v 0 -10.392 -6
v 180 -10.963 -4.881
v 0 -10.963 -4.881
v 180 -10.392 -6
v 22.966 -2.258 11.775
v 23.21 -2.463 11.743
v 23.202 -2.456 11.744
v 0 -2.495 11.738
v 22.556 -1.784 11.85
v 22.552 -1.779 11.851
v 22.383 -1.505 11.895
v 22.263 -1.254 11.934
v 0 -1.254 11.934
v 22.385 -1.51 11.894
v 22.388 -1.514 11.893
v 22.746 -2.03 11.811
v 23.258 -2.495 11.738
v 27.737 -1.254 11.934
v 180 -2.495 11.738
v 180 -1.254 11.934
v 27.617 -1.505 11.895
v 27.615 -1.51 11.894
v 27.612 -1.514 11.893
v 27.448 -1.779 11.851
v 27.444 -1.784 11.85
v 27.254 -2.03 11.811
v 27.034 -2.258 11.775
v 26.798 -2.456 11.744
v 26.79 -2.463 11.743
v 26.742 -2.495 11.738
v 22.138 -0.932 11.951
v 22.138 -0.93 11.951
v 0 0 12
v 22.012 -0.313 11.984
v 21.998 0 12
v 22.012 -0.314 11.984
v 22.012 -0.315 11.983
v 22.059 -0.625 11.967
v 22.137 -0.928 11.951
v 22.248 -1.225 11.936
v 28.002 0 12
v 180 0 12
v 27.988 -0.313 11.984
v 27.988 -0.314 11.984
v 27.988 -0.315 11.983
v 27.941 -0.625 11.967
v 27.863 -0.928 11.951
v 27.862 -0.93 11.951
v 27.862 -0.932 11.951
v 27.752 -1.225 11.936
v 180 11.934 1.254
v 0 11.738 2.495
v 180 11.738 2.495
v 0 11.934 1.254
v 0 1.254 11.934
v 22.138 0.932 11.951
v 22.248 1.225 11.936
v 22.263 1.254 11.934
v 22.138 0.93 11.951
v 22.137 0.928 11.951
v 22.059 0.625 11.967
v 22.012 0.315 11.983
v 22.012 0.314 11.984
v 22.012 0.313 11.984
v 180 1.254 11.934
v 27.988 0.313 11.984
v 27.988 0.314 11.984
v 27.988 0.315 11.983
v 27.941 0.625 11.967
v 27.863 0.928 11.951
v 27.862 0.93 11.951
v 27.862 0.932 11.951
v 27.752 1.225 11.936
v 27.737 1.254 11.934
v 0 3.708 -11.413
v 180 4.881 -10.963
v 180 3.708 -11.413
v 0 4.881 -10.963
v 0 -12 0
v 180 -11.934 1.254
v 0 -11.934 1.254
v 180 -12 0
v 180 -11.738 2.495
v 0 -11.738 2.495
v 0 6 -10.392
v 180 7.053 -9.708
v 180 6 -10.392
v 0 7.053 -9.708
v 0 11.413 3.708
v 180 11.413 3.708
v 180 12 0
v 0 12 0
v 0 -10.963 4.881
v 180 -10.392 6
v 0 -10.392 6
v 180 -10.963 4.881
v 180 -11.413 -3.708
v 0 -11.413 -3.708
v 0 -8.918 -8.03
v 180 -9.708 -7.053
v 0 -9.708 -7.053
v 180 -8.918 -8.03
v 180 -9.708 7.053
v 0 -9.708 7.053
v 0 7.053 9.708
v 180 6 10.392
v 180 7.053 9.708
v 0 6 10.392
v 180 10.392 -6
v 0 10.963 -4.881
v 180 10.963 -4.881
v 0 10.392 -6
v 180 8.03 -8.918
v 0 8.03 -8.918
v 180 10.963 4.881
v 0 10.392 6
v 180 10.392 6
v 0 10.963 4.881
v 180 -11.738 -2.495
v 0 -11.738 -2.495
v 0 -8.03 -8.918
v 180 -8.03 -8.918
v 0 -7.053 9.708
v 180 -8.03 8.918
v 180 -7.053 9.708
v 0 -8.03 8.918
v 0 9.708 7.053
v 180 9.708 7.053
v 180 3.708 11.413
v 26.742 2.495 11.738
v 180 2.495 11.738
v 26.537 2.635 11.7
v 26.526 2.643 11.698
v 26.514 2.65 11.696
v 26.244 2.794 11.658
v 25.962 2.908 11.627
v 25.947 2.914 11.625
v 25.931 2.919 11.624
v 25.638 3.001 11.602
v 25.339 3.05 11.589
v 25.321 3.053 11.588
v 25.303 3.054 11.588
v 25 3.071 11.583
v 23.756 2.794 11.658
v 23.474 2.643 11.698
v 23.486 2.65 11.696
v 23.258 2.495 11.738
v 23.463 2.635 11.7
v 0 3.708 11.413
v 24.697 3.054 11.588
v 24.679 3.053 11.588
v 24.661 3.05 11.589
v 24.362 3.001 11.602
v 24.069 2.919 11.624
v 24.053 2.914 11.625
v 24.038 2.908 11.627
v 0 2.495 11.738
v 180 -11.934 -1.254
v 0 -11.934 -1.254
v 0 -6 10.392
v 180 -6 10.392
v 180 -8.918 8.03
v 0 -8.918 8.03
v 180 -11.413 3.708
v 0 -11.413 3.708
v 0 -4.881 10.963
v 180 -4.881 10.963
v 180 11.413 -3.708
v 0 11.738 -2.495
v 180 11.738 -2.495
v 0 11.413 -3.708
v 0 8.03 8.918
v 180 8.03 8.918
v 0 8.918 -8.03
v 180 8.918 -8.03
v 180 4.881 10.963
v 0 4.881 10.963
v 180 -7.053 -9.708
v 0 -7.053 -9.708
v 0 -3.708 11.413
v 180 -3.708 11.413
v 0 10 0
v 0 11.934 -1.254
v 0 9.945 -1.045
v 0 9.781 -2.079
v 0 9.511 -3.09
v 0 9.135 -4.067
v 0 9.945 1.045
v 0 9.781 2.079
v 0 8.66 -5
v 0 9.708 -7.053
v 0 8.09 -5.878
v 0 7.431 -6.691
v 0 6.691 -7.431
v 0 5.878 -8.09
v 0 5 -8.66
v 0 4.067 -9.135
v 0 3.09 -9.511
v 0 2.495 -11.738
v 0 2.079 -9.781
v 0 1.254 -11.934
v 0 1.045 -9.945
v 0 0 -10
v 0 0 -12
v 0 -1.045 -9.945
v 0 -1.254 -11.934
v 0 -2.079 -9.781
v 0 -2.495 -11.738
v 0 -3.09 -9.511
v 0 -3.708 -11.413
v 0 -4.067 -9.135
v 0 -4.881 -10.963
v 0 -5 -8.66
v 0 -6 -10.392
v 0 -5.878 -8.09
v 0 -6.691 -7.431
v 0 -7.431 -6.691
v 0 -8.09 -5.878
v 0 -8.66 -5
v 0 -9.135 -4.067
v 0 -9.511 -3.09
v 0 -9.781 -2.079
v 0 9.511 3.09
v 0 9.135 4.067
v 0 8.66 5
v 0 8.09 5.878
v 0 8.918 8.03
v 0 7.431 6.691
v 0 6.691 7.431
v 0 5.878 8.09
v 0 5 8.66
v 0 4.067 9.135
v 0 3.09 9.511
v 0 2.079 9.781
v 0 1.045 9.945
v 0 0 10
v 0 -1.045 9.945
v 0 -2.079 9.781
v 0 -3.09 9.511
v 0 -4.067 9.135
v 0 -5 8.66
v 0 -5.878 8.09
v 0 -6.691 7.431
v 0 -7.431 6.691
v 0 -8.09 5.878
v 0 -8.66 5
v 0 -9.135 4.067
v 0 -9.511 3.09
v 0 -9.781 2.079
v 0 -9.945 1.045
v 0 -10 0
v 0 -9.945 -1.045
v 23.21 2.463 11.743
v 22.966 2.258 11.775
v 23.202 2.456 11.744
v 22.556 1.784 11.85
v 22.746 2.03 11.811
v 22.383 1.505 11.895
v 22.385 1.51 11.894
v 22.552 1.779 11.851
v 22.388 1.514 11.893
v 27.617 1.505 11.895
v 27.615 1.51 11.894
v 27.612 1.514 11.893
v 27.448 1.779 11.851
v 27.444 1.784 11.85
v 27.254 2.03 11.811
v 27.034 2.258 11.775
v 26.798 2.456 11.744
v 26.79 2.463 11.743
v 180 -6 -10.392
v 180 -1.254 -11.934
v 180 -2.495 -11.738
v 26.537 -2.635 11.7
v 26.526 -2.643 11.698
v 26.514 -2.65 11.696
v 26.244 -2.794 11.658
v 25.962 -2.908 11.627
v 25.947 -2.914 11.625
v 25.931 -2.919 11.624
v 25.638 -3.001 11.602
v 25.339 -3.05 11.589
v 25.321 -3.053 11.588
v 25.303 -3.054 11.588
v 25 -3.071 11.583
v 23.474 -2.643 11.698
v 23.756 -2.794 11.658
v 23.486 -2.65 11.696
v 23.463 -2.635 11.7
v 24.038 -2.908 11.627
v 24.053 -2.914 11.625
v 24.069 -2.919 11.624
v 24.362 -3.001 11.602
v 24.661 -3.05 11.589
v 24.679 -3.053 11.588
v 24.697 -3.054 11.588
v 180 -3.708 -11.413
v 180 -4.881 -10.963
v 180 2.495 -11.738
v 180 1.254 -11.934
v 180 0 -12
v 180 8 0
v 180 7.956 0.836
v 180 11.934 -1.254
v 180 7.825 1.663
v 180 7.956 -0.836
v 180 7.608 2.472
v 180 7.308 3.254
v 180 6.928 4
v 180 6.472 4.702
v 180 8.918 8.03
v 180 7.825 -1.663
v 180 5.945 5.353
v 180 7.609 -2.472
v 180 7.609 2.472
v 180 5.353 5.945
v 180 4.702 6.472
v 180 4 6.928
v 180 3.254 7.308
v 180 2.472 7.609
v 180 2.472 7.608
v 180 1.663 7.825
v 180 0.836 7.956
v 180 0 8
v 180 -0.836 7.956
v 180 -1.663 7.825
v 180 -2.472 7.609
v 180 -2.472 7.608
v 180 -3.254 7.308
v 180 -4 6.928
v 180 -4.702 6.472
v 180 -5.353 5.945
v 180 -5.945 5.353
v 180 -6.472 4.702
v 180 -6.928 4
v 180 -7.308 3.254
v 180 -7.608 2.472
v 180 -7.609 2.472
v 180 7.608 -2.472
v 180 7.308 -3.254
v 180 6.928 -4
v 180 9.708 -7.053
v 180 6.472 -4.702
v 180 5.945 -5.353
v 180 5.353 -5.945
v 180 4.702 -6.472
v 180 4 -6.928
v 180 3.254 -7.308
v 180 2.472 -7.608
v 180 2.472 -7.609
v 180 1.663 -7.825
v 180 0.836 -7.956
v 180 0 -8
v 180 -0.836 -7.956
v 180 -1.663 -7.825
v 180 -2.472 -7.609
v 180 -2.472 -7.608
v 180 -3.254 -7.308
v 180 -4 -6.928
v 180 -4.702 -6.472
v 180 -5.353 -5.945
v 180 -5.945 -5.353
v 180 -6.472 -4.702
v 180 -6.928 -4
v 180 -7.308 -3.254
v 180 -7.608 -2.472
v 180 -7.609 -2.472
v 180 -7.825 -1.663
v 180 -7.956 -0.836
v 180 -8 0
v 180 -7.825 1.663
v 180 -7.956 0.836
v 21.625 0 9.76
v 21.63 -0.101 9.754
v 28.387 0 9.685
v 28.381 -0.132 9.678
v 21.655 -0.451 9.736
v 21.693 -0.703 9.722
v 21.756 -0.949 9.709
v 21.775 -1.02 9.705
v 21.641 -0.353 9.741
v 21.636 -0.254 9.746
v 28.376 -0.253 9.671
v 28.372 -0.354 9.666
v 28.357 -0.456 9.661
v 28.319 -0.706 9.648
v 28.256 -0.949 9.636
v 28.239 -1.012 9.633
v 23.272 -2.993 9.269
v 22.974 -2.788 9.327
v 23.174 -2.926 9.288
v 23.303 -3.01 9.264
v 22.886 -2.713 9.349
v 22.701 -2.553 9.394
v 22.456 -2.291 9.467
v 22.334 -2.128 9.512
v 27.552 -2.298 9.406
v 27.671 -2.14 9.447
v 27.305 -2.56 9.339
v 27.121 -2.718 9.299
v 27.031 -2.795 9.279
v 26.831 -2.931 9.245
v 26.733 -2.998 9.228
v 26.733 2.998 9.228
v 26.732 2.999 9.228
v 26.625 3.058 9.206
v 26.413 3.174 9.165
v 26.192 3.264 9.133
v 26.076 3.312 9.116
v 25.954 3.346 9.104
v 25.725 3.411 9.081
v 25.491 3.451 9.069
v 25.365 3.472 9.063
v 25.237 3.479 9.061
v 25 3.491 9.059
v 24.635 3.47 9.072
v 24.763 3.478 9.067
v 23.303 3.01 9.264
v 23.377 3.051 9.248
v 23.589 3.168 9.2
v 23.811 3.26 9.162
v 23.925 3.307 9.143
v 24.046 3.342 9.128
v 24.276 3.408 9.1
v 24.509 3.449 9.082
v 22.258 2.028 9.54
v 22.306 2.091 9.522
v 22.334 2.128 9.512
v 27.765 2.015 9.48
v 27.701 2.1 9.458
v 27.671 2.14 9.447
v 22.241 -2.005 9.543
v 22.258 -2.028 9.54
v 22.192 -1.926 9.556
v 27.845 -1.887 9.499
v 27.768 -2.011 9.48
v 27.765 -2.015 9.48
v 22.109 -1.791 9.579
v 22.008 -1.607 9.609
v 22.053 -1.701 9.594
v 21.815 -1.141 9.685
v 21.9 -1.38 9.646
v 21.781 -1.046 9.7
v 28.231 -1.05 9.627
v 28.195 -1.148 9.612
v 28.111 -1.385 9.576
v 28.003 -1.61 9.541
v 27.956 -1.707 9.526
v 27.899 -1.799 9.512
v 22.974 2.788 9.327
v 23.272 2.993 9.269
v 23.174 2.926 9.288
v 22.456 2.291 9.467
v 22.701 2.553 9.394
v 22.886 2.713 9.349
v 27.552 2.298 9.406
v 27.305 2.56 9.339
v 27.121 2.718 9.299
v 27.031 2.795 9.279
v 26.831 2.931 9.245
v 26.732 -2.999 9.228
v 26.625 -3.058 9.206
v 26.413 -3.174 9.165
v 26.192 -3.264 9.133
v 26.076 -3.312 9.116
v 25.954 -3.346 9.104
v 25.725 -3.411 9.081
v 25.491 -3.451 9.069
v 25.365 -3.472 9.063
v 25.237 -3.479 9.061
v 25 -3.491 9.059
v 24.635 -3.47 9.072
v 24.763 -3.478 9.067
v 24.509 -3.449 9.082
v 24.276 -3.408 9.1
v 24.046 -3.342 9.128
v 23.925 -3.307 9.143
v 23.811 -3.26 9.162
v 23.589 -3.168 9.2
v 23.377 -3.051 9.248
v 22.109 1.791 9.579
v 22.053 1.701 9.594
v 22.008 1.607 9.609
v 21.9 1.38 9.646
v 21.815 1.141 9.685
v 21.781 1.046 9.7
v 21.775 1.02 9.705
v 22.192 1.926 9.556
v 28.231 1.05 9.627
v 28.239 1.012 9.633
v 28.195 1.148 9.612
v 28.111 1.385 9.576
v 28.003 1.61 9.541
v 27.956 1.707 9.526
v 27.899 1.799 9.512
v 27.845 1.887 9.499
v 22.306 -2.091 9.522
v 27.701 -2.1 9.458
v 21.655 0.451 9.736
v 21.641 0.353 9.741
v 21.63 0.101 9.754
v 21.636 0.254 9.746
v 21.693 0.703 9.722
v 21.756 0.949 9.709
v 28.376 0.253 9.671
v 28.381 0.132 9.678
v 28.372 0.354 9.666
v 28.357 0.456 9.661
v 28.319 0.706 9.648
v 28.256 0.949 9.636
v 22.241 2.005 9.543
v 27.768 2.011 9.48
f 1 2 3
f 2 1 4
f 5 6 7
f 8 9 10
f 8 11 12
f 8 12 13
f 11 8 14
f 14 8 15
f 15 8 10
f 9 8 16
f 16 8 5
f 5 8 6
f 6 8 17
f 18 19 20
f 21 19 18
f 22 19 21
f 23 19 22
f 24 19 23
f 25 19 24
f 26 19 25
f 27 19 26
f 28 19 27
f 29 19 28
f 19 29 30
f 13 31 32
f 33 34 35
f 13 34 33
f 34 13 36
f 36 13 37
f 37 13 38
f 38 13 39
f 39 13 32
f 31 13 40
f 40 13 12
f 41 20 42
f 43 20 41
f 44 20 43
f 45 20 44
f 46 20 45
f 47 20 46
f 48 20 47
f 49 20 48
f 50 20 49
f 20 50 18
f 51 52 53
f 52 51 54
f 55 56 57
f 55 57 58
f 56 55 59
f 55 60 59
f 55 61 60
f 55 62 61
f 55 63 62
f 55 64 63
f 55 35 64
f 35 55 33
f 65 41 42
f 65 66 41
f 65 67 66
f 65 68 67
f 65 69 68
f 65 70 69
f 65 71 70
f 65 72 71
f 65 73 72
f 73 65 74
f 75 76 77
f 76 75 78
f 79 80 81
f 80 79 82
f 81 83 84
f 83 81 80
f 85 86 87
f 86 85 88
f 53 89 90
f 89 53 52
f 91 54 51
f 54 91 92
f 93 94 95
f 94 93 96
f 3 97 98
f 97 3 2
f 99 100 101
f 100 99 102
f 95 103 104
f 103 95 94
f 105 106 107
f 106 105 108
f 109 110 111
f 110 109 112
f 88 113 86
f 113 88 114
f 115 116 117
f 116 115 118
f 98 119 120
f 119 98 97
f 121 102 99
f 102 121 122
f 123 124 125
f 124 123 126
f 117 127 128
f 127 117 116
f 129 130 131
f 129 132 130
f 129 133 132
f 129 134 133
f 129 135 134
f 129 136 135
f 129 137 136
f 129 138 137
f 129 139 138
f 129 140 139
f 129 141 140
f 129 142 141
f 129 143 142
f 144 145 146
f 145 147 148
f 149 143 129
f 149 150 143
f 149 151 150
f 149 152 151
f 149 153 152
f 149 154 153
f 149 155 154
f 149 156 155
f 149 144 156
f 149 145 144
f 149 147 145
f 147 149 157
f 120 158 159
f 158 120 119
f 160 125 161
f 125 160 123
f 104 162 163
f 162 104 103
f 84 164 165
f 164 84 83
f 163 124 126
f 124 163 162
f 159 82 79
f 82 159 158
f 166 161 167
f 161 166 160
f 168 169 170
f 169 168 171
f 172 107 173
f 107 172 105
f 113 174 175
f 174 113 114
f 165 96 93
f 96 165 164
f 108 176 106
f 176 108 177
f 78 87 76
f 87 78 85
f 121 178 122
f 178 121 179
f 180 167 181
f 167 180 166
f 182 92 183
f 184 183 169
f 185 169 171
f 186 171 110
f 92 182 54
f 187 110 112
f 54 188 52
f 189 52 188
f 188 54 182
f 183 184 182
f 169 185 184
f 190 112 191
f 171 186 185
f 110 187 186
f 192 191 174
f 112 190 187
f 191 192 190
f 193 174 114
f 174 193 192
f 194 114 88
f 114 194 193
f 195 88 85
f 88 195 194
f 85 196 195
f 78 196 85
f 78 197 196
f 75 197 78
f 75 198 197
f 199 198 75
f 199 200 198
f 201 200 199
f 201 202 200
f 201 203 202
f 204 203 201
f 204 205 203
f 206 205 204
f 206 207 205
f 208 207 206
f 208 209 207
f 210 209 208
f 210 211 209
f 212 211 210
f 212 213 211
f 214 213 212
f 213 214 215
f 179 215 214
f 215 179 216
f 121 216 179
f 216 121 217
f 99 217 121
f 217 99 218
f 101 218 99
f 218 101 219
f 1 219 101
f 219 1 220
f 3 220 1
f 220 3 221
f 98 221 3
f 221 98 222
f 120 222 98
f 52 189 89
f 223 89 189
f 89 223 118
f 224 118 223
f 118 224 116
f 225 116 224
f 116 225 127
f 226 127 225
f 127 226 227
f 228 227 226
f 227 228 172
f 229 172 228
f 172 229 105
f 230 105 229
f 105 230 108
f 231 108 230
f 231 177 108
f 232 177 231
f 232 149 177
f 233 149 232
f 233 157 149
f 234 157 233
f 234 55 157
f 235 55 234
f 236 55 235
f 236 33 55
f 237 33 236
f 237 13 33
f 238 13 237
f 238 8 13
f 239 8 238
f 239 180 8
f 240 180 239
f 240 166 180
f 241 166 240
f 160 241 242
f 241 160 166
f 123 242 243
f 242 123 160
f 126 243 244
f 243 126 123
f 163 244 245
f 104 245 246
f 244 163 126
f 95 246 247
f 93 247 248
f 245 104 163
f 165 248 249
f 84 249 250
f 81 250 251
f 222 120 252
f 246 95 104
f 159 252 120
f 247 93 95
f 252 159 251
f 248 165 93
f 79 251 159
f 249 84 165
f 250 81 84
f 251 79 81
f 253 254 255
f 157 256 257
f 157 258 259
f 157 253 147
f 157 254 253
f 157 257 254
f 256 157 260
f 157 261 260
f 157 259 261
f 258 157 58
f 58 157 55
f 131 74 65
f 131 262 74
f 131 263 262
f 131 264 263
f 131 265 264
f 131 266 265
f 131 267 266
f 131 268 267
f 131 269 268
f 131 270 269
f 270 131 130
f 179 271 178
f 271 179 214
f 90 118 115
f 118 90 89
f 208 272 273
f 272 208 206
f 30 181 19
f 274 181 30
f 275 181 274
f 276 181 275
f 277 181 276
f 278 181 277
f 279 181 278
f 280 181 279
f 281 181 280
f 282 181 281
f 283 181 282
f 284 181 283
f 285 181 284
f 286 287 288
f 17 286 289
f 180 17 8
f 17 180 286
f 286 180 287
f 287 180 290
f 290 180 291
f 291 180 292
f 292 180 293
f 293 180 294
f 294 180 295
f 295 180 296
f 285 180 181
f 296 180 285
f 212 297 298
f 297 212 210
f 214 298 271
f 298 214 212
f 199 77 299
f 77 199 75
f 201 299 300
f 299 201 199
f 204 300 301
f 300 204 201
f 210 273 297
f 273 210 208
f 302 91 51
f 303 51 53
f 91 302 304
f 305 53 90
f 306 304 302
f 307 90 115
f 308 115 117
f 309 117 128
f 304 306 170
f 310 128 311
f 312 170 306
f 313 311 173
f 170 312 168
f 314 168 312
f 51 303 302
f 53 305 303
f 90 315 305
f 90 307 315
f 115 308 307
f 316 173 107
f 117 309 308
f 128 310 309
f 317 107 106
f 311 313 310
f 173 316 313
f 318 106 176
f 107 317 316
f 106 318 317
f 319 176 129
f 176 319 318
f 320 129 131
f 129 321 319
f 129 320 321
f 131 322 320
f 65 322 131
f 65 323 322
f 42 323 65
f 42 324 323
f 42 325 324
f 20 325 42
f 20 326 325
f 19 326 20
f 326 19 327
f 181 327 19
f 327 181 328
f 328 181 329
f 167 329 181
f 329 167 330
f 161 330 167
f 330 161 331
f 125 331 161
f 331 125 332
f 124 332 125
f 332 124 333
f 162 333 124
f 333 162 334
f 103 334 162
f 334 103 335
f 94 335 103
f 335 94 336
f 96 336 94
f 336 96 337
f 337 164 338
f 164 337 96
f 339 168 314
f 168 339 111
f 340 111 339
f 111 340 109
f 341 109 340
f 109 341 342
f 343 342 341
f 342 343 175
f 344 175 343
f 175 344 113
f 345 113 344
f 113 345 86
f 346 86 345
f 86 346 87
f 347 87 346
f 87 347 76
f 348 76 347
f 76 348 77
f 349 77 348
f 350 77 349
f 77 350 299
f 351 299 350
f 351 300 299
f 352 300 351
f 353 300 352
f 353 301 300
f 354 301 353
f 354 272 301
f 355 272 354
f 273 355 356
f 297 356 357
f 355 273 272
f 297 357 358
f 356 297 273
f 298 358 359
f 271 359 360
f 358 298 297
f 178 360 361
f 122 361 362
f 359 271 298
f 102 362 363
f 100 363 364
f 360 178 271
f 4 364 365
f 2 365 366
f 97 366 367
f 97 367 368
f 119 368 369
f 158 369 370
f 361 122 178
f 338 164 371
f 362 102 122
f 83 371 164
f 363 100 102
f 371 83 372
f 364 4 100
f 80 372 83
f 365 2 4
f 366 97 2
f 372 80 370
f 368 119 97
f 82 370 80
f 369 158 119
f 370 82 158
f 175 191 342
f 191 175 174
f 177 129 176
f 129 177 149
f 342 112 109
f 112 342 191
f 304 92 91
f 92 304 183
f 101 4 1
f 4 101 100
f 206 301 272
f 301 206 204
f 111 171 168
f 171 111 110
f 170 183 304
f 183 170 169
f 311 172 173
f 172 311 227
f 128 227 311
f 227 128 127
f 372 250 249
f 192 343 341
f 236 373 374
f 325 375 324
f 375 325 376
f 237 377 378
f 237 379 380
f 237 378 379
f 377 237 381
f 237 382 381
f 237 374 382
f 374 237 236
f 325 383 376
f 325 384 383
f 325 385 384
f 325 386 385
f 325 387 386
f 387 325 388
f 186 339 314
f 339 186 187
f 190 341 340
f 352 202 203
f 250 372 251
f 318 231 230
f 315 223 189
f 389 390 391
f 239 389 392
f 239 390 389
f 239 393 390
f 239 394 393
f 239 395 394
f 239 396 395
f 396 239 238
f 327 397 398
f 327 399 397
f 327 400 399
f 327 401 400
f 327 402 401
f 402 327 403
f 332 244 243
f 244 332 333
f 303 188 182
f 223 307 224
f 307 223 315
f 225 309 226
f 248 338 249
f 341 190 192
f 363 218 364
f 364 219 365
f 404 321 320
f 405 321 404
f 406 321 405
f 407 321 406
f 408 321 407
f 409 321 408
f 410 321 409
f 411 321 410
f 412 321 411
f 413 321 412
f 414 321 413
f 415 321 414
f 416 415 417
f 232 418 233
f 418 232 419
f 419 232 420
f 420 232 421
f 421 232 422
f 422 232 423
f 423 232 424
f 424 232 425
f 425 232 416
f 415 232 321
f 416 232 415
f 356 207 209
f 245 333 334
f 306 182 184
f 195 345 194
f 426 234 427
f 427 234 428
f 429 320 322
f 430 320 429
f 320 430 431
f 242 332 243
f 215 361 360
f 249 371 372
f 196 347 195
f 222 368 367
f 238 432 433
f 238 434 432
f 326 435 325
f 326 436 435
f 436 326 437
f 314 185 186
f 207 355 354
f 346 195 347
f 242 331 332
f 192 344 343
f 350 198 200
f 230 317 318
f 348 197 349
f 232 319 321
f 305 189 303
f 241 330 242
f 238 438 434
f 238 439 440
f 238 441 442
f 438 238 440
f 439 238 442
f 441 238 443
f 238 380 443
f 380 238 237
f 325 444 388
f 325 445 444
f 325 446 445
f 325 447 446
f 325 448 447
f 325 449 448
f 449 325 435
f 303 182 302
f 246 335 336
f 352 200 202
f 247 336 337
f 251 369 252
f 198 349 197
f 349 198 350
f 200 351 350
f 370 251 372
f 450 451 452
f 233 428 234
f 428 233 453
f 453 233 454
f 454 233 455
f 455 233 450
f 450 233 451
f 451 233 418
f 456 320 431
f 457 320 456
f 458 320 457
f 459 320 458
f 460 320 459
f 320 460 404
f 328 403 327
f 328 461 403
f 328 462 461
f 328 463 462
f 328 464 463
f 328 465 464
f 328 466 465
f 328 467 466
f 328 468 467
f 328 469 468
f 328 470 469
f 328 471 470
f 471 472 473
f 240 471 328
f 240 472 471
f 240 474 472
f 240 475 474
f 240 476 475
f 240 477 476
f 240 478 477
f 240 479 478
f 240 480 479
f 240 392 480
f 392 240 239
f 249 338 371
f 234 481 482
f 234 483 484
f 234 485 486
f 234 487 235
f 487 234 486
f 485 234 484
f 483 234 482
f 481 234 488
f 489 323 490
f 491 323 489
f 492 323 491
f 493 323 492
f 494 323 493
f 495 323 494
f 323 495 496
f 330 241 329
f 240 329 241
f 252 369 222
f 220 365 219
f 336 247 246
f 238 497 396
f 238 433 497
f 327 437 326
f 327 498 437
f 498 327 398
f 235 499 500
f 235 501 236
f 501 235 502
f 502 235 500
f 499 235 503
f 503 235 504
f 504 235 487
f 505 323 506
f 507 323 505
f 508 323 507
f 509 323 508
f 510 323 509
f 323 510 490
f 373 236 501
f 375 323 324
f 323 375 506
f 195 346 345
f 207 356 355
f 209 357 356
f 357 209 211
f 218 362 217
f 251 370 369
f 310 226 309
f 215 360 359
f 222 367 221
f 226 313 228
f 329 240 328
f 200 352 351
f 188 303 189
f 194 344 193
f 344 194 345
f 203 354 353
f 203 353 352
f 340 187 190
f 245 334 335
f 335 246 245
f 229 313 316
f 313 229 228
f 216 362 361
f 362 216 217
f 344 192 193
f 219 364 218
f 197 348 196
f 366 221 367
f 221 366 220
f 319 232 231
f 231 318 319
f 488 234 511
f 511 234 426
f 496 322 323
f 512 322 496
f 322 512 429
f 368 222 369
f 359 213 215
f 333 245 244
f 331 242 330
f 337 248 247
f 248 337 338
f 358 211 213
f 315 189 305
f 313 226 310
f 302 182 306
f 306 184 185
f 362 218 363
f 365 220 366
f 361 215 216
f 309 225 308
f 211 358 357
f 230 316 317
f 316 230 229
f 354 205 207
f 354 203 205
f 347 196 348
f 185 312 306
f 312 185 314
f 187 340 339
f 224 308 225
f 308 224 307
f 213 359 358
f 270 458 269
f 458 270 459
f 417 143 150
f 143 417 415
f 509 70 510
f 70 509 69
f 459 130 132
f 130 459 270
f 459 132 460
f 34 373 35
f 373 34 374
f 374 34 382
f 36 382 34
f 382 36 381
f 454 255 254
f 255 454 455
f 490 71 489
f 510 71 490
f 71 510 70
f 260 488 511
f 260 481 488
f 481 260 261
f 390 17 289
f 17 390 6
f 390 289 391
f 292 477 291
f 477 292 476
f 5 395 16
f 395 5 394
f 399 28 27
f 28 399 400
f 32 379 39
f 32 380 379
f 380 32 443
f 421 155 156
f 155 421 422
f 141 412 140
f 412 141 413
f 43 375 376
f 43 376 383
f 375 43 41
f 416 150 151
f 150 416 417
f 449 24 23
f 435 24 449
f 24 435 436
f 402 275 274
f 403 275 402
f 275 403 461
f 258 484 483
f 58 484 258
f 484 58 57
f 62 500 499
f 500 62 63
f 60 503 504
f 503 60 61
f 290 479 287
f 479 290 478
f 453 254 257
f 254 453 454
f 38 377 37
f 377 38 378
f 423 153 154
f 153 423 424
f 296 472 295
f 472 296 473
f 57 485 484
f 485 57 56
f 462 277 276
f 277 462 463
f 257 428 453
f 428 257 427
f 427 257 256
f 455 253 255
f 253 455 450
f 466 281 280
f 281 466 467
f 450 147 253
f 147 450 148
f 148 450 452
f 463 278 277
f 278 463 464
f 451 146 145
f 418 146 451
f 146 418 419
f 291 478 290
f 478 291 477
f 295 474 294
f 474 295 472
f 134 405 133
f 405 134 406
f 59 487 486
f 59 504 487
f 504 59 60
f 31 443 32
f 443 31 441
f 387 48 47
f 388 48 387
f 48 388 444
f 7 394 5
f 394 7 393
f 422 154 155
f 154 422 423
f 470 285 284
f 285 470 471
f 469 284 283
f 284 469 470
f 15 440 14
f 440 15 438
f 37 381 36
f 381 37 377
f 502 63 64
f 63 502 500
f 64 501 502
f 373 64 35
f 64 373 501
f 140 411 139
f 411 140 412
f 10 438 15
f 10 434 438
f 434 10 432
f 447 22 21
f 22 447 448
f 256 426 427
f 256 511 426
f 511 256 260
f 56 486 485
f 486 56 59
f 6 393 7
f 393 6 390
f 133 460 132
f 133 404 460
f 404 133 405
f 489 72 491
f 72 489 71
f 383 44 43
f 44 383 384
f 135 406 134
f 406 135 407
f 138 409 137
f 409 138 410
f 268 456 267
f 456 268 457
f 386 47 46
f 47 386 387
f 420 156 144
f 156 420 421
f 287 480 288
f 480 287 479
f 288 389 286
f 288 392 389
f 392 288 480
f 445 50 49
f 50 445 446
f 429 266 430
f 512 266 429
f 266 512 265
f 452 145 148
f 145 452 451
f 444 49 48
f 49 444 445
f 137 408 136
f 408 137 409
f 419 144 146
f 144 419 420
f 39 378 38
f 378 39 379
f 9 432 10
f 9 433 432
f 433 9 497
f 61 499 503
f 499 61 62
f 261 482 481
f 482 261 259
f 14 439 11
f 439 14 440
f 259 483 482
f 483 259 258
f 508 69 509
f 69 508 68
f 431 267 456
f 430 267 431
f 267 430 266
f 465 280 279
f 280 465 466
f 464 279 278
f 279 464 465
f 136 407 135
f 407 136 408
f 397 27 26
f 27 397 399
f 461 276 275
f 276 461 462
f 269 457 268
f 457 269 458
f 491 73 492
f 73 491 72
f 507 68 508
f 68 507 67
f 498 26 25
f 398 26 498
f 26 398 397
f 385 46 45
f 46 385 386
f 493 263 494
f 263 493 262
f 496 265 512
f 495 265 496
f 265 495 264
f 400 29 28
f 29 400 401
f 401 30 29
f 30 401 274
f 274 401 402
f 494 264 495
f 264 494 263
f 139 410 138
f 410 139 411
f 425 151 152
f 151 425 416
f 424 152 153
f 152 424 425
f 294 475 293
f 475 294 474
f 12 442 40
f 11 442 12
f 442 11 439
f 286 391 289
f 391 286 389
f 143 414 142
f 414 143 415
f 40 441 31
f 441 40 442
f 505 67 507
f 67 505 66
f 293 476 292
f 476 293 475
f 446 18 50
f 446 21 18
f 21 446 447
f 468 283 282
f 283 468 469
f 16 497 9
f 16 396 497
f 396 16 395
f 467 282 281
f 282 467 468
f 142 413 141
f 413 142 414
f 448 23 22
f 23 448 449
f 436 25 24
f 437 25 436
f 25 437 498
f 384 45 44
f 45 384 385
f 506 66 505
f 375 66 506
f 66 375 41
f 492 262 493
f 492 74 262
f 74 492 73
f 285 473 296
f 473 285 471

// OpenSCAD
// file: lib/shapes.scad
/*
 * Parametric CSG Flute Model
 *   Author: Isaac W Hanson
 *   License: MIT
 *
 * Shape modules
 */

module hole(pos=0,r1=2,r2=2,h=10) {
    translate([0,0,pos])
        rotate([0,90,0])
            cylinder(r1=r1,r2=r2,h=h);
}

module turn(length=1,bore1=1,bore2=1,thick1=1,thick2=1) {
    difference() {
        cylinder(r1=bore1+thick1,r2=bore2+thick2,h=length);
        translate([0,0,-0.005])
            cylinder(r1=bore1,r2=bore2,h=length+0.01);
    }
}
// file: lib/config.scad
/*
 * Parametric CSG Flute Model
 *   Author: Isaac W Hanson
 *   License: MIT
 *
 * Configuration variables
 */

/* default minimum fragment angle (deg) */
fa = 6;
$fa = fa;
echo($fa=$fa);

/* default minimum fragment size (mm) */
fs = 0.5;
$fs = fs;
echo($fs=$fs);
// main file
/*
 * Parametric CSG Flute Model
 *   Author: Isaac W Hanson
 *   License: MIT
 */
include <lib/config.scad>
use <lib/shapes.scad>

rotate([0,-90,180])
difference() {
    turn(bore1=10,bore2=8,length=180,thick1=2,thick2=4);
    hole(pos=25,r1=5,r2=3,h=12.01);
}
